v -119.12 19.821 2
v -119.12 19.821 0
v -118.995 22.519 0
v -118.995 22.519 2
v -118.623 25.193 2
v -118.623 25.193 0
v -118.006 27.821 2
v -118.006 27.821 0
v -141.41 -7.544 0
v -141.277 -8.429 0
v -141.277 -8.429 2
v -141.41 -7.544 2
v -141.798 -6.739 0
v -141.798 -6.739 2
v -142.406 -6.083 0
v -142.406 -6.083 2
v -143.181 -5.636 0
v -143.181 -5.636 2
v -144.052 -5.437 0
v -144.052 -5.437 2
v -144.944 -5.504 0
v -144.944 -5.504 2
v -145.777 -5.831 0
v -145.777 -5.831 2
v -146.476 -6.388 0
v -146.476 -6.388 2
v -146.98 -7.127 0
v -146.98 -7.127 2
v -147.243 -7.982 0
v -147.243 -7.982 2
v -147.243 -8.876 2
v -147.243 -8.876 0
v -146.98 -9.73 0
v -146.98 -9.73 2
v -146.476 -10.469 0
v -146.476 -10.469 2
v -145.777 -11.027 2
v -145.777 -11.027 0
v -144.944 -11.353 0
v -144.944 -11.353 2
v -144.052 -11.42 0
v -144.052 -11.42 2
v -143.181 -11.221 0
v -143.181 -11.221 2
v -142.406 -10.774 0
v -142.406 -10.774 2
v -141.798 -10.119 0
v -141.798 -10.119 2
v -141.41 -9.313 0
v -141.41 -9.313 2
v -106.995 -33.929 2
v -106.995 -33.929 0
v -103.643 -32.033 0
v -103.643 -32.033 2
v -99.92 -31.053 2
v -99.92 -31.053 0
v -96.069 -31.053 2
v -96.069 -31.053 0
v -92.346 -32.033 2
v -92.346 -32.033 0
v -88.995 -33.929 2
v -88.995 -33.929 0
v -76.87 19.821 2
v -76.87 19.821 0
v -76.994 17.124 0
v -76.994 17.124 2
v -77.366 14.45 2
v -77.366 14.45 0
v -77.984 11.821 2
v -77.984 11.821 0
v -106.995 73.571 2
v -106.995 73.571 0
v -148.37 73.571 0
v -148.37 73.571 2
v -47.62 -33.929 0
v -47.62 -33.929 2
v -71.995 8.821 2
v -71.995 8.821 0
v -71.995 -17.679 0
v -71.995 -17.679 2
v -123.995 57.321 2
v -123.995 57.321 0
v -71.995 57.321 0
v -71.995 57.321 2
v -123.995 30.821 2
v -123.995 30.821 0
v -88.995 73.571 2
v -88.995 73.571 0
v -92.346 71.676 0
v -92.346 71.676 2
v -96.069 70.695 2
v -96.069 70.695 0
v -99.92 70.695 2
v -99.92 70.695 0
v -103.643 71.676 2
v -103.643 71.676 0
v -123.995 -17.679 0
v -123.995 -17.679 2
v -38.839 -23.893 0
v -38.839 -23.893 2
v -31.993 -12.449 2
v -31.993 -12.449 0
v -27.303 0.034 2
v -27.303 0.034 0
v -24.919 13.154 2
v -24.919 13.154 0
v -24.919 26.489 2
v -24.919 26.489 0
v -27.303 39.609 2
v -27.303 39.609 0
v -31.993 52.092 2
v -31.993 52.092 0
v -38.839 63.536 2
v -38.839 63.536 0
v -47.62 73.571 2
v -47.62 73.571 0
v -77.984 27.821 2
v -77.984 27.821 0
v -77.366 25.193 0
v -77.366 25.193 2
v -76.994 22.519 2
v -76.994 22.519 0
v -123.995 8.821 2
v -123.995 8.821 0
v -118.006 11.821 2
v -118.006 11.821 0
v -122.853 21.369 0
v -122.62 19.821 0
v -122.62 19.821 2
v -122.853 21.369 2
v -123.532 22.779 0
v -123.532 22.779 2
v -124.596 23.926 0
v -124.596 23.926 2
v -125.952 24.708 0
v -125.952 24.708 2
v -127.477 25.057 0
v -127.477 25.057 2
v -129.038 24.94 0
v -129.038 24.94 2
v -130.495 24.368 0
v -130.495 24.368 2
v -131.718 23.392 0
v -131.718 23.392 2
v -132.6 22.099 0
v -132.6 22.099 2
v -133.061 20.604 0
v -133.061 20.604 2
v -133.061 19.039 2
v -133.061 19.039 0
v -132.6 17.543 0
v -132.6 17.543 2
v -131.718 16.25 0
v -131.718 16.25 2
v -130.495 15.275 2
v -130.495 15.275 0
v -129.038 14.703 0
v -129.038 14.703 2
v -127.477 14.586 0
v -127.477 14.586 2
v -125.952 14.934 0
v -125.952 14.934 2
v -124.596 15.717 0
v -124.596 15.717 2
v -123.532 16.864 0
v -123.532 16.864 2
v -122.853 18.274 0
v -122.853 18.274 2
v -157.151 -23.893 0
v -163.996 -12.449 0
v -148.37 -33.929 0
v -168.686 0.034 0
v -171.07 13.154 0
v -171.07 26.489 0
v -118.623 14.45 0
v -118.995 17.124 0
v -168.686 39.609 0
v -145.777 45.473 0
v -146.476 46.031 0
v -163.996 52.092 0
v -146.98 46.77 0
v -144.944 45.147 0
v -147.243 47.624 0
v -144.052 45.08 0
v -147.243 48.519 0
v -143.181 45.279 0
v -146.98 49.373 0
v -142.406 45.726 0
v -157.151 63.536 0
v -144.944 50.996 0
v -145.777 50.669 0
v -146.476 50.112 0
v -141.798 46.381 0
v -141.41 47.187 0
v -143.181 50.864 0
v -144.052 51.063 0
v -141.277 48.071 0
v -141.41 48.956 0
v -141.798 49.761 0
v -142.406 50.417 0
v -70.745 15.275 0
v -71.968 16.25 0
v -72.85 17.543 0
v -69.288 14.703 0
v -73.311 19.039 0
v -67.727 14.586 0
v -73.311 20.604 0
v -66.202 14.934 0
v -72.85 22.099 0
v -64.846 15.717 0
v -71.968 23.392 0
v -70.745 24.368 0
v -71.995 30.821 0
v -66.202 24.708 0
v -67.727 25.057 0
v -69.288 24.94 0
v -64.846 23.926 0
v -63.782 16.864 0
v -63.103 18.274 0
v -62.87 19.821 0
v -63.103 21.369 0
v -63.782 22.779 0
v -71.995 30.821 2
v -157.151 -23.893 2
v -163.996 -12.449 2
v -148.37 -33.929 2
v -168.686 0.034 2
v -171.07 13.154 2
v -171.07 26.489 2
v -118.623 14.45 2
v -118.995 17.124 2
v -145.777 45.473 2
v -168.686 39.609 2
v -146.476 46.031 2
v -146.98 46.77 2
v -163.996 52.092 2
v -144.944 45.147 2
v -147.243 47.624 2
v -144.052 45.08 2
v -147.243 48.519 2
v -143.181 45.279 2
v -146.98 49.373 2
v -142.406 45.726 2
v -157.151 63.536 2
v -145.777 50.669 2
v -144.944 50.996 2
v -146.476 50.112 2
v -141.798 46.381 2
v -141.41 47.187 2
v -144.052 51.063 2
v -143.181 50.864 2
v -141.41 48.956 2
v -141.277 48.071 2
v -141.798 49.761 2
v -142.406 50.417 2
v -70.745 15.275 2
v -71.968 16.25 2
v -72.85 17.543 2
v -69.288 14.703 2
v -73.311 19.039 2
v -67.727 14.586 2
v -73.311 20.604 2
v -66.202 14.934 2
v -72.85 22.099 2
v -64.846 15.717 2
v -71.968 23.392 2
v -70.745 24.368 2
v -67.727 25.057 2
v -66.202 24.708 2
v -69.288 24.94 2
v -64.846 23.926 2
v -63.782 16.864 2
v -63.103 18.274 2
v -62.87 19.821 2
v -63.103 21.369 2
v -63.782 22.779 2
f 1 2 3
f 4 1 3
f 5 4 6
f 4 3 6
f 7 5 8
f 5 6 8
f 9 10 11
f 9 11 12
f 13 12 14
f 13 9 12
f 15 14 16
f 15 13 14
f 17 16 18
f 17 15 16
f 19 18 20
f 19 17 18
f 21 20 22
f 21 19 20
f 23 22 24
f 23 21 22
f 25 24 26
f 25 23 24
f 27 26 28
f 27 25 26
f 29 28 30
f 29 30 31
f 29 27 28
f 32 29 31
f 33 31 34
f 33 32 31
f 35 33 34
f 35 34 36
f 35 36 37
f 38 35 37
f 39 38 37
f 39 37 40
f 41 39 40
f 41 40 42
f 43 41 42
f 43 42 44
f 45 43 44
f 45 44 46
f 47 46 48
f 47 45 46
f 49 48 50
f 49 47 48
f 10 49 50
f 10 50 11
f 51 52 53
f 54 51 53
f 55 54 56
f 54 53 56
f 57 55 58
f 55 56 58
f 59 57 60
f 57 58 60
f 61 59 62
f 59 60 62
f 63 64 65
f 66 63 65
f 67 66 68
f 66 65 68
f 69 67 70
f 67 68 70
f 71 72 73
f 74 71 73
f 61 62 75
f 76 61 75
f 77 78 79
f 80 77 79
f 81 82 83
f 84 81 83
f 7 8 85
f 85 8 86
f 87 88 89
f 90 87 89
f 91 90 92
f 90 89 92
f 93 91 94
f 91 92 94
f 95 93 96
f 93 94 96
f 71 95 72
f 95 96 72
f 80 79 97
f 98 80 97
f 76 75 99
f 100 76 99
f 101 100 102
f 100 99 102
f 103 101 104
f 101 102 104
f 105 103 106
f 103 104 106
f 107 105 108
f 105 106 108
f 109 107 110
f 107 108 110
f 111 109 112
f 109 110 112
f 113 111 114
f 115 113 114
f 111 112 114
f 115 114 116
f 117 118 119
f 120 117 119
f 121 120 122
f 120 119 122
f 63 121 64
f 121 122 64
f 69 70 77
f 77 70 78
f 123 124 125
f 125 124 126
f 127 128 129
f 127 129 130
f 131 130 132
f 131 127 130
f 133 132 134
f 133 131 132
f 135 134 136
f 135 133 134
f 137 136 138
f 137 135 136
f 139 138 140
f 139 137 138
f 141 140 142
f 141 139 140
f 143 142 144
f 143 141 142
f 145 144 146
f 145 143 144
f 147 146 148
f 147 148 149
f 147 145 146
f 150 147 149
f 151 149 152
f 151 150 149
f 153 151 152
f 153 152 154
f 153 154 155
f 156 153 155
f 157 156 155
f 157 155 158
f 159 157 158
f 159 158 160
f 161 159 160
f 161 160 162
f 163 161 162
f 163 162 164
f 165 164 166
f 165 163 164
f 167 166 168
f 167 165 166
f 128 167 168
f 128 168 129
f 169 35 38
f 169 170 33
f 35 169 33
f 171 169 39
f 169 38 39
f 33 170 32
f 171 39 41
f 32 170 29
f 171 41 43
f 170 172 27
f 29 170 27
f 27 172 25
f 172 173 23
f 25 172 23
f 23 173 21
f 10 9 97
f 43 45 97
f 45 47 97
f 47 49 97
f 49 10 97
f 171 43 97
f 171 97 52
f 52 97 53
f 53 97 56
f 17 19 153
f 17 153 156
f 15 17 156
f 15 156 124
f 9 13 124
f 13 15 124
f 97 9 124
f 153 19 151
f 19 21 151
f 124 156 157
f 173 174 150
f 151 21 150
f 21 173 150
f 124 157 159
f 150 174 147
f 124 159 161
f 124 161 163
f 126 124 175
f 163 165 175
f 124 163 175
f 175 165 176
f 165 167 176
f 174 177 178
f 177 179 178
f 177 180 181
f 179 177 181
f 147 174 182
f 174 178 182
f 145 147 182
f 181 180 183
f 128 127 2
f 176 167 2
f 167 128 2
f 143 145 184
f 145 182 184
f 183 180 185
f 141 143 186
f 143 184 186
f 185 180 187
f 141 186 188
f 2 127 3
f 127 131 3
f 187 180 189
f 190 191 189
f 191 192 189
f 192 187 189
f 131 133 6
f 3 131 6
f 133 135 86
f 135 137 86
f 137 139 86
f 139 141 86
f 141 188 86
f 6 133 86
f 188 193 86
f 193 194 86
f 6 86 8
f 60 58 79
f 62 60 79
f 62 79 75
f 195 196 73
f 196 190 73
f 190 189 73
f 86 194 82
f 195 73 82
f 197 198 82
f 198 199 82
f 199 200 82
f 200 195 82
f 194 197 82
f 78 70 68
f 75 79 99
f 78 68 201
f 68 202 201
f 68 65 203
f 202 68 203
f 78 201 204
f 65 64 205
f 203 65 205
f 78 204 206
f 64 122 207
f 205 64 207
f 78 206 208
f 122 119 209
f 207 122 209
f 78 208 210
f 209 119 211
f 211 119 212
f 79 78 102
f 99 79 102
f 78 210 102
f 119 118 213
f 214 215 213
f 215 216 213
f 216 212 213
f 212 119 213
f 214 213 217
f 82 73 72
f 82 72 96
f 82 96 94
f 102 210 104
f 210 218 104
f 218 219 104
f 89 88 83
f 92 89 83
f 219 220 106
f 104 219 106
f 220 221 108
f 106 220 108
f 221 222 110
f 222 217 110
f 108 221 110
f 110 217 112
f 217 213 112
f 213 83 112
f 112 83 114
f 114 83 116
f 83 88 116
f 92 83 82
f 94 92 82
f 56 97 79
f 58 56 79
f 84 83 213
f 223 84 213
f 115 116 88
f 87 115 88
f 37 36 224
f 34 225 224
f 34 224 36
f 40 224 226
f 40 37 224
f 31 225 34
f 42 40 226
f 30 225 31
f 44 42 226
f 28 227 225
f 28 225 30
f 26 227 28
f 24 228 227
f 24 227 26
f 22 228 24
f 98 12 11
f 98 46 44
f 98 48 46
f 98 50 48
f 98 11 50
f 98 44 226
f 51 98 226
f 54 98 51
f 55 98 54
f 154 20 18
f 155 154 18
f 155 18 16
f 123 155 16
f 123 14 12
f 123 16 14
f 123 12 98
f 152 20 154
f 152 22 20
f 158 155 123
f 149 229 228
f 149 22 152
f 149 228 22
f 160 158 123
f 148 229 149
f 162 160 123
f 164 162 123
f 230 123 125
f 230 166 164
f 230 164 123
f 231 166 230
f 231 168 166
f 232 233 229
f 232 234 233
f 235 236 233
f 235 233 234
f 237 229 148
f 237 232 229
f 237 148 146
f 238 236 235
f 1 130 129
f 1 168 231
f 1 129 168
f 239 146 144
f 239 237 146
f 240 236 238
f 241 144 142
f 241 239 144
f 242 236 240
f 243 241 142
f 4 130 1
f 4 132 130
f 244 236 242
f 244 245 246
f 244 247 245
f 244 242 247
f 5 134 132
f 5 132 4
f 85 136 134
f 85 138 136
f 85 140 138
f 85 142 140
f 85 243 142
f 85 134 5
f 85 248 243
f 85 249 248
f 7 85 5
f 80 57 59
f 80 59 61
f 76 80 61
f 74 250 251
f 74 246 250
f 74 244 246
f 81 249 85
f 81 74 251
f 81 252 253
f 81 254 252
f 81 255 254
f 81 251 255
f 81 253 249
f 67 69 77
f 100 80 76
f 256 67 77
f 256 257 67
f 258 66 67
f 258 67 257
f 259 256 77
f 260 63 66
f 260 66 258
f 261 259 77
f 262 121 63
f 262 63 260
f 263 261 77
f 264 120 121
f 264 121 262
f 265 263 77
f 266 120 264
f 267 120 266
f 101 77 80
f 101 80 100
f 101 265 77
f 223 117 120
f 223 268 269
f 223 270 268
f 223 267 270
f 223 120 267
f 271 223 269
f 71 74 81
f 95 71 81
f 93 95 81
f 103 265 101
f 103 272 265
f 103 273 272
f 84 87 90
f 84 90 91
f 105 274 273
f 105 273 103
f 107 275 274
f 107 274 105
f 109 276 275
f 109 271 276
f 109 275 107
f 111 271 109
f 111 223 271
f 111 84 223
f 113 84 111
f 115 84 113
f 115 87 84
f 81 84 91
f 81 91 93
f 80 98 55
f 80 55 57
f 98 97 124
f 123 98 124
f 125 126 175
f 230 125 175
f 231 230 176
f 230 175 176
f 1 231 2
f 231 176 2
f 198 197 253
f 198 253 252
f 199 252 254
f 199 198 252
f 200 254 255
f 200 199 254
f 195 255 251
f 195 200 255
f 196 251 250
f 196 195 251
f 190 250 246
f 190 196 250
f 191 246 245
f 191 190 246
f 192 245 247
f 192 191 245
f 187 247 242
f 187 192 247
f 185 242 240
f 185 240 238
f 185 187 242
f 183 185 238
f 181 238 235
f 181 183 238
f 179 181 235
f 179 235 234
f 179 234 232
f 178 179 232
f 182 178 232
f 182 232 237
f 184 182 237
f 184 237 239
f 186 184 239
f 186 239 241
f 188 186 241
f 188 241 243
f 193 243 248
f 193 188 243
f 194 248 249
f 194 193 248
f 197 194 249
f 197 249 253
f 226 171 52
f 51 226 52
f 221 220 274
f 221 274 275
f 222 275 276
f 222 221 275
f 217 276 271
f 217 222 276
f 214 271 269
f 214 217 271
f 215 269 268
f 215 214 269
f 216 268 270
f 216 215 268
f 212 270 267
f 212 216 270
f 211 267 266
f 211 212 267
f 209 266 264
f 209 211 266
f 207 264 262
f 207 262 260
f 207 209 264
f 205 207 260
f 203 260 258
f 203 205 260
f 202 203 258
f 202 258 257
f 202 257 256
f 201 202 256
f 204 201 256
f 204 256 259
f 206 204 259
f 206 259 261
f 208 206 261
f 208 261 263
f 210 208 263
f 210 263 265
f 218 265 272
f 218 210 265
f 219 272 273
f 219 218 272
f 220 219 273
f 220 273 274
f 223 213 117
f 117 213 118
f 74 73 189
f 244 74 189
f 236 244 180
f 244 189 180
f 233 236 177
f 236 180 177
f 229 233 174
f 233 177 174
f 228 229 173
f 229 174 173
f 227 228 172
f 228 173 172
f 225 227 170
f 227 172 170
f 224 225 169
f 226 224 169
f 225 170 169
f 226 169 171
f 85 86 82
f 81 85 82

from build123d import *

# Parameters (mm, degrees)
F0_R     = 3
F0_R_2   = 5.25
F1_DEPTH = 2


with BuildPart() as f1:
    # F0 (on Top) → F1 (new body)
    with BuildSketch(Plane.XY):
        with BuildLine():
            Line((-106.994636, 73.57139), (-148.369657, 73.57139))
            ThreePointArc((-148.369657, 73.57139), (-171.369657, 19.821374), (-148.369657, -33.928643))
            Line((-148.369657, -33.928643), (-106.994636, -33.928643))
            ThreePointArc((-106.994636, -33.928643), (-97.994636, -30.928643), (-88.994636, -33.928643))
            Line((-88.994636, -33.928643), (-47.619614, -33.928643))
            ThreePointArc((-47.619614, -33.928643), (-24.619614, 19.821374), (-47.619614, 73.57139))
            Line((-47.619614, 73.57139), (-88.994636, 73.57139))
            ThreePointArc((-88.994636, 73.57139), (-97.994636, 70.57139), (-106.994636, 73.57139))
        make_face()
        with Locations((-144.276634, -8.428643)):
            Circle(F0_R, mode=Mode.SUBTRACT)
        with Locations((-127.869657, 19.821374)):
            Circle(F0_R_2, mode=Mode.SUBTRACT)
        with Locations((-68.119614, 19.821374)):
            Circle(F0_R_2, mode=Mode.SUBTRACT)
        with BuildLine():
            Line((-123.994636, 30.821374), (-123.994636, 57.321374))
            Line((-123.994636, 57.321374), (-71.994636, 57.321374))
            Line((-71.994636, 57.321374), (-71.994636, 30.821374))
            Line((-71.994636, 30.821374), (-77.983549, 27.821374))
            ThreePointArc((-77.983549, 27.821374), (-77.149435, 23.859964), (-76.869614, 19.821374))
            ThreePointArc((-76.869614, 19.821374), (-77.149435, 15.782783), (-77.983549, 11.821374))
            Line((-77.983549, 11.821374), (-71.994636, 8.821374))
            Line((-71.994636, 8.821374), (-71.994636, -17.678626))
            Line((-71.994636, -17.678626), (-123.994636, -17.678626))
            Line((-123.994636, -17.678626), (-123.994636, 8.821374))
            Line((-123.994636, 8.821374), (-118.005723, 11.821374))
            ThreePointArc((-118.005723, 11.821374), (-118.839837, 15.782783), (-119.119657, 19.821374))
            ThreePointArc((-119.119657, 19.821374), (-118.839837, 23.859964), (-118.005723, 27.821374))
            Line((-118.005723, 27.821374), (-123.994636, 30.821374))
        make_face(mode=Mode.SUBTRACT)
        with Locations((-144.276634, 48.07139)):
            Circle(F0_R, mode=Mode.SUBTRACT)
    extrude(amount=F1_DEPTH)


solid = f1.part
